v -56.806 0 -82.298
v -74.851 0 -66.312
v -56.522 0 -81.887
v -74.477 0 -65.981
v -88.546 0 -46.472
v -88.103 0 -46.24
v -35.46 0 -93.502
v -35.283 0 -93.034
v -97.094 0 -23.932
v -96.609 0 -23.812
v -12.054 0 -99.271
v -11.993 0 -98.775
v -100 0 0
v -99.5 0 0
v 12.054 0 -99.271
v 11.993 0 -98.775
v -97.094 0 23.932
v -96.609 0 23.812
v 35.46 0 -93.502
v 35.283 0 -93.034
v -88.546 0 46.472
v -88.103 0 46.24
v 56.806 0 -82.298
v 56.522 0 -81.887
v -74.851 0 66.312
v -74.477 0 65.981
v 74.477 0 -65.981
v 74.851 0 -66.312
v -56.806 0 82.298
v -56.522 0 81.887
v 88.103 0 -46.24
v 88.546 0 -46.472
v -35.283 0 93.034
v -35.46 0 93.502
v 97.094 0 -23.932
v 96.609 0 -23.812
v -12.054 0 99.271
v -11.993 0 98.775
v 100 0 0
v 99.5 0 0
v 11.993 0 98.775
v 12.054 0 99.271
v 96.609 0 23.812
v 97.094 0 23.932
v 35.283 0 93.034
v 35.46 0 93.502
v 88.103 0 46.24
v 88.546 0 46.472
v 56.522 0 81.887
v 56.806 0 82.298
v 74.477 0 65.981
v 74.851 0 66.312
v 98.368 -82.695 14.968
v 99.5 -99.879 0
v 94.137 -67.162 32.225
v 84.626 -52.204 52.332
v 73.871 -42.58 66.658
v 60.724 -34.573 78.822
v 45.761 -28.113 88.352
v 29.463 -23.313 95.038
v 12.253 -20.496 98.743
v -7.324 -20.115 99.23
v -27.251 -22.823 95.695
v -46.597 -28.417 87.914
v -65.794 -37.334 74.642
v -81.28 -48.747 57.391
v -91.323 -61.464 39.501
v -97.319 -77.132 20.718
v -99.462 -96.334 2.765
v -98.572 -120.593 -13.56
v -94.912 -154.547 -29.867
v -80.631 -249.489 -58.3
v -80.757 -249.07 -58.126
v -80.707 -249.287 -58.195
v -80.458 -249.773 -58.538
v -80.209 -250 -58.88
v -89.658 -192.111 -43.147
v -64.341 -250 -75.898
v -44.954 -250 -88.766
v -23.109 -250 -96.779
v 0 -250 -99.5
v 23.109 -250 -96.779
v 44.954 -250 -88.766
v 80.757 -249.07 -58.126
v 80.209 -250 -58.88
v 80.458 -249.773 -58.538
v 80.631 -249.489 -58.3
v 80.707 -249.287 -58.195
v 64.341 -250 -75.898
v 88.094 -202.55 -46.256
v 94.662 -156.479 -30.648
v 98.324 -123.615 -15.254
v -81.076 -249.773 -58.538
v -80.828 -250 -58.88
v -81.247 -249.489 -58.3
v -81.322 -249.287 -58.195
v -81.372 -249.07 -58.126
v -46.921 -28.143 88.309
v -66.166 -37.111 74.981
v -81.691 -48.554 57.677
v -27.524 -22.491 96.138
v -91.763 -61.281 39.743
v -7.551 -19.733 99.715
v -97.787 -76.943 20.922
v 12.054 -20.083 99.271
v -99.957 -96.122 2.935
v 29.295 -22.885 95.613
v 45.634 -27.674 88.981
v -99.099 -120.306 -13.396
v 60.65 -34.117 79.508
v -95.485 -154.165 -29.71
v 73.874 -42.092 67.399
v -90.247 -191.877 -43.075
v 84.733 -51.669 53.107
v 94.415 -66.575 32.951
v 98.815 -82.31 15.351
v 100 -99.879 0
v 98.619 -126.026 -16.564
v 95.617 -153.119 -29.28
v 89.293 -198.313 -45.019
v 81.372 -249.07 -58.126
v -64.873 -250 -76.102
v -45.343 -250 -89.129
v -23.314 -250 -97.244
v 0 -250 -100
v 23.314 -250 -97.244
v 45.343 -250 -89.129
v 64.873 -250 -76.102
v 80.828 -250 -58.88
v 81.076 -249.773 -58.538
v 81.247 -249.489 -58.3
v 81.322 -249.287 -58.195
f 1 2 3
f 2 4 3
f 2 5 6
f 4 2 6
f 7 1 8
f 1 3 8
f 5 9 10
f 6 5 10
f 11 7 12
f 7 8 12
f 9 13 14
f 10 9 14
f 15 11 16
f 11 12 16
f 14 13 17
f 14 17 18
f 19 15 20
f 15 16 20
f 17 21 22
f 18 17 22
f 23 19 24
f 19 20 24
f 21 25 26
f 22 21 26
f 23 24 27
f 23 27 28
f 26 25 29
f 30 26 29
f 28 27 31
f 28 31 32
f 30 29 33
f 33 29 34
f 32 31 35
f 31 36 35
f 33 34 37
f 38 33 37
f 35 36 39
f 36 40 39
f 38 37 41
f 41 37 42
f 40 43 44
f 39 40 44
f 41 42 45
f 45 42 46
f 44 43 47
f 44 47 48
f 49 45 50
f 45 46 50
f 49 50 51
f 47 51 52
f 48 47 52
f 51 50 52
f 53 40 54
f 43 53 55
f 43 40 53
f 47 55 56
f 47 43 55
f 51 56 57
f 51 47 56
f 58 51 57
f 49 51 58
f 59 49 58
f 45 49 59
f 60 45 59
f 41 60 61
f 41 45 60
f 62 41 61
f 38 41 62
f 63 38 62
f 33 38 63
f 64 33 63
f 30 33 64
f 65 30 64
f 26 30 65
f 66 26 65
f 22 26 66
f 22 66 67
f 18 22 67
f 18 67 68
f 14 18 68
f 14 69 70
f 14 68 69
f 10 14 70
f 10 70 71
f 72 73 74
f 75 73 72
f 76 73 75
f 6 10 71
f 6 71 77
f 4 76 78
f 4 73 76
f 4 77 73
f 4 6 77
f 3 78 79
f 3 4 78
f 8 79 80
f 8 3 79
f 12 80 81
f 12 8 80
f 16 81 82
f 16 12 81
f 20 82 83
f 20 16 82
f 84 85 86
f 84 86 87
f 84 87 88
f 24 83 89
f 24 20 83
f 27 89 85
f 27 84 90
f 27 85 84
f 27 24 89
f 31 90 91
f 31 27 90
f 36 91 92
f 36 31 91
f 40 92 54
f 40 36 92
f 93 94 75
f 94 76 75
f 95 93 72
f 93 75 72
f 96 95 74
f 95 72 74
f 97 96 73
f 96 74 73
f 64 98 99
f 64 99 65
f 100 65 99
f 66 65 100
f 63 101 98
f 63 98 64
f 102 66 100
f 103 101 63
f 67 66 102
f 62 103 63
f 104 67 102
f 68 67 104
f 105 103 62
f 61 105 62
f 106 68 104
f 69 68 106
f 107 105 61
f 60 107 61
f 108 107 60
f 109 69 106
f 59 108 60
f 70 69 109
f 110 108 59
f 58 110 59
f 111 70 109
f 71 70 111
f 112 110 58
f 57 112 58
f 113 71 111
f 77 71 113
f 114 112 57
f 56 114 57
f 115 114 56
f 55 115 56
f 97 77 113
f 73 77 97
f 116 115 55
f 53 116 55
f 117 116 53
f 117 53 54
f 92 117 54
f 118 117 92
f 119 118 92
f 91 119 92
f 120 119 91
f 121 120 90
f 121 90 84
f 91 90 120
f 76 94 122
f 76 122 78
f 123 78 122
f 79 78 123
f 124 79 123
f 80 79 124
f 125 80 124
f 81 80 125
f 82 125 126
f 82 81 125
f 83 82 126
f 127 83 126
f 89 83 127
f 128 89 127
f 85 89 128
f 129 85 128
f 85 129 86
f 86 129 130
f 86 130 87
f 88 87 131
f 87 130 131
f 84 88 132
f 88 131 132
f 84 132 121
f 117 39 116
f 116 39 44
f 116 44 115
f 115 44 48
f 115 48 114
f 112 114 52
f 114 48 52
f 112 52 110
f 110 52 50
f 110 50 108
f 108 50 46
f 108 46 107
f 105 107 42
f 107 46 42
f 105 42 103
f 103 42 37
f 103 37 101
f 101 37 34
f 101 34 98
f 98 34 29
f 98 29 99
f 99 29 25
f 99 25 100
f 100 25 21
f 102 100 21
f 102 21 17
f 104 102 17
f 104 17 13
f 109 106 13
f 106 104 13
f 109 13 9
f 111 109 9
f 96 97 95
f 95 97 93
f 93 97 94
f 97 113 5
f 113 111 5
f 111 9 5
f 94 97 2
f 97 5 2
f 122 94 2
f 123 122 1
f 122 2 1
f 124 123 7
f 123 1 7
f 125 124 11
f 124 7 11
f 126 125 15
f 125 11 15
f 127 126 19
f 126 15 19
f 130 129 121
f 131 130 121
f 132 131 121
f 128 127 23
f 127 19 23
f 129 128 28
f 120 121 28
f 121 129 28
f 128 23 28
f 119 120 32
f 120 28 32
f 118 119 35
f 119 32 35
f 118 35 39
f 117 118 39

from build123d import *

# Parameters (mm, degrees)
F0_R     = 100
F0_R_2   = 99.5
F1_DEPTH = 50
F3_R     = 100
F3_R_2   = 99.5
F4_DEPTH = 200
F7_DEPTH = 222


with BuildPart() as f1:
    # F0 (on Front) → F1 (new body)
    with BuildSketch(Plane.XZ):
        Circle(F0_R)
        Circle(F0_R_2, mode=Mode.SUBTRACT)
    extrude(amount=F1_DEPTH)

    # F3 (on offset) → F4 (join)
    with BuildSketch(Plane.XZ.offset(50)):
        Circle(F3_R)
        Circle(F3_R_2, mode=Mode.SUBTRACT)
    extrude(amount=F4_DEPTH)

    # F6 (on offset) → F7 (cut)
    with BuildSketch(Plane.YZ.offset(100)):
        with BuildLine():
            add(Edge.make_bspline(
                [(-11.5396156907, 109.1770529747), (-37.40660144, 82.3029038002), (-74.6953320253, -14.6375859027), (-206.542273136, -48.3033385091), (-249.0700861085, -58.1255167434)],
                knots=[0, 0, 0, 0, 0.4686228188, 0.9205231007, 0.9205231007, 0.9205231007, 0.9205231007], degree=3))
            Line((-11.5396156907, 109.1770529747), (-268.6304729415, 109.1770529747))
            Line((-268.6304729415, 109.1770529747), (-269.2039608955, -62.7321824431))
            add(Edge.make_bspline(
                [(-249.0700861085, -58.1255167434), (-256.5495652028, -59.8529692417), (-263.3424316326, -61.3730310201), (-269.2039608955, -62.7321824431)],
                knots=[0.9205231007, 0.9205231007, 0.9205231007, 0.9205231007, 1, 1, 1, 1], degree=3))
        make_face()
        with BuildLine():
            ThreePointArc((-250.1155138016, -59.2780299485), (-249.7733014387, -58.5380431181), (-249.0700861085, -58.1255167434))
            add(Edge.make_bspline(
                [(-249.0700861085, -58.1255167434), (-256.5495652028, -59.8529692417), (-263.3424316326, -61.3730310201), (-269.2039608955, -62.7321824431)],
                knots=[0.9205231007, 0.9205231007, 0.9205231007, 0.9205231007, 1, 1, 1, 1], degree=3))
            Line((-269.2039608955, -62.7321824431), (-254.4201612473, -60.6556199491))
            Line((-254.4201612473, -60.6556199491), (-250.1155138016, -59.2780299485))
        make_face()
    extrude(amount=-F7_DEPTH, mode=Mode.SUBTRACT)


solid = f1.part
